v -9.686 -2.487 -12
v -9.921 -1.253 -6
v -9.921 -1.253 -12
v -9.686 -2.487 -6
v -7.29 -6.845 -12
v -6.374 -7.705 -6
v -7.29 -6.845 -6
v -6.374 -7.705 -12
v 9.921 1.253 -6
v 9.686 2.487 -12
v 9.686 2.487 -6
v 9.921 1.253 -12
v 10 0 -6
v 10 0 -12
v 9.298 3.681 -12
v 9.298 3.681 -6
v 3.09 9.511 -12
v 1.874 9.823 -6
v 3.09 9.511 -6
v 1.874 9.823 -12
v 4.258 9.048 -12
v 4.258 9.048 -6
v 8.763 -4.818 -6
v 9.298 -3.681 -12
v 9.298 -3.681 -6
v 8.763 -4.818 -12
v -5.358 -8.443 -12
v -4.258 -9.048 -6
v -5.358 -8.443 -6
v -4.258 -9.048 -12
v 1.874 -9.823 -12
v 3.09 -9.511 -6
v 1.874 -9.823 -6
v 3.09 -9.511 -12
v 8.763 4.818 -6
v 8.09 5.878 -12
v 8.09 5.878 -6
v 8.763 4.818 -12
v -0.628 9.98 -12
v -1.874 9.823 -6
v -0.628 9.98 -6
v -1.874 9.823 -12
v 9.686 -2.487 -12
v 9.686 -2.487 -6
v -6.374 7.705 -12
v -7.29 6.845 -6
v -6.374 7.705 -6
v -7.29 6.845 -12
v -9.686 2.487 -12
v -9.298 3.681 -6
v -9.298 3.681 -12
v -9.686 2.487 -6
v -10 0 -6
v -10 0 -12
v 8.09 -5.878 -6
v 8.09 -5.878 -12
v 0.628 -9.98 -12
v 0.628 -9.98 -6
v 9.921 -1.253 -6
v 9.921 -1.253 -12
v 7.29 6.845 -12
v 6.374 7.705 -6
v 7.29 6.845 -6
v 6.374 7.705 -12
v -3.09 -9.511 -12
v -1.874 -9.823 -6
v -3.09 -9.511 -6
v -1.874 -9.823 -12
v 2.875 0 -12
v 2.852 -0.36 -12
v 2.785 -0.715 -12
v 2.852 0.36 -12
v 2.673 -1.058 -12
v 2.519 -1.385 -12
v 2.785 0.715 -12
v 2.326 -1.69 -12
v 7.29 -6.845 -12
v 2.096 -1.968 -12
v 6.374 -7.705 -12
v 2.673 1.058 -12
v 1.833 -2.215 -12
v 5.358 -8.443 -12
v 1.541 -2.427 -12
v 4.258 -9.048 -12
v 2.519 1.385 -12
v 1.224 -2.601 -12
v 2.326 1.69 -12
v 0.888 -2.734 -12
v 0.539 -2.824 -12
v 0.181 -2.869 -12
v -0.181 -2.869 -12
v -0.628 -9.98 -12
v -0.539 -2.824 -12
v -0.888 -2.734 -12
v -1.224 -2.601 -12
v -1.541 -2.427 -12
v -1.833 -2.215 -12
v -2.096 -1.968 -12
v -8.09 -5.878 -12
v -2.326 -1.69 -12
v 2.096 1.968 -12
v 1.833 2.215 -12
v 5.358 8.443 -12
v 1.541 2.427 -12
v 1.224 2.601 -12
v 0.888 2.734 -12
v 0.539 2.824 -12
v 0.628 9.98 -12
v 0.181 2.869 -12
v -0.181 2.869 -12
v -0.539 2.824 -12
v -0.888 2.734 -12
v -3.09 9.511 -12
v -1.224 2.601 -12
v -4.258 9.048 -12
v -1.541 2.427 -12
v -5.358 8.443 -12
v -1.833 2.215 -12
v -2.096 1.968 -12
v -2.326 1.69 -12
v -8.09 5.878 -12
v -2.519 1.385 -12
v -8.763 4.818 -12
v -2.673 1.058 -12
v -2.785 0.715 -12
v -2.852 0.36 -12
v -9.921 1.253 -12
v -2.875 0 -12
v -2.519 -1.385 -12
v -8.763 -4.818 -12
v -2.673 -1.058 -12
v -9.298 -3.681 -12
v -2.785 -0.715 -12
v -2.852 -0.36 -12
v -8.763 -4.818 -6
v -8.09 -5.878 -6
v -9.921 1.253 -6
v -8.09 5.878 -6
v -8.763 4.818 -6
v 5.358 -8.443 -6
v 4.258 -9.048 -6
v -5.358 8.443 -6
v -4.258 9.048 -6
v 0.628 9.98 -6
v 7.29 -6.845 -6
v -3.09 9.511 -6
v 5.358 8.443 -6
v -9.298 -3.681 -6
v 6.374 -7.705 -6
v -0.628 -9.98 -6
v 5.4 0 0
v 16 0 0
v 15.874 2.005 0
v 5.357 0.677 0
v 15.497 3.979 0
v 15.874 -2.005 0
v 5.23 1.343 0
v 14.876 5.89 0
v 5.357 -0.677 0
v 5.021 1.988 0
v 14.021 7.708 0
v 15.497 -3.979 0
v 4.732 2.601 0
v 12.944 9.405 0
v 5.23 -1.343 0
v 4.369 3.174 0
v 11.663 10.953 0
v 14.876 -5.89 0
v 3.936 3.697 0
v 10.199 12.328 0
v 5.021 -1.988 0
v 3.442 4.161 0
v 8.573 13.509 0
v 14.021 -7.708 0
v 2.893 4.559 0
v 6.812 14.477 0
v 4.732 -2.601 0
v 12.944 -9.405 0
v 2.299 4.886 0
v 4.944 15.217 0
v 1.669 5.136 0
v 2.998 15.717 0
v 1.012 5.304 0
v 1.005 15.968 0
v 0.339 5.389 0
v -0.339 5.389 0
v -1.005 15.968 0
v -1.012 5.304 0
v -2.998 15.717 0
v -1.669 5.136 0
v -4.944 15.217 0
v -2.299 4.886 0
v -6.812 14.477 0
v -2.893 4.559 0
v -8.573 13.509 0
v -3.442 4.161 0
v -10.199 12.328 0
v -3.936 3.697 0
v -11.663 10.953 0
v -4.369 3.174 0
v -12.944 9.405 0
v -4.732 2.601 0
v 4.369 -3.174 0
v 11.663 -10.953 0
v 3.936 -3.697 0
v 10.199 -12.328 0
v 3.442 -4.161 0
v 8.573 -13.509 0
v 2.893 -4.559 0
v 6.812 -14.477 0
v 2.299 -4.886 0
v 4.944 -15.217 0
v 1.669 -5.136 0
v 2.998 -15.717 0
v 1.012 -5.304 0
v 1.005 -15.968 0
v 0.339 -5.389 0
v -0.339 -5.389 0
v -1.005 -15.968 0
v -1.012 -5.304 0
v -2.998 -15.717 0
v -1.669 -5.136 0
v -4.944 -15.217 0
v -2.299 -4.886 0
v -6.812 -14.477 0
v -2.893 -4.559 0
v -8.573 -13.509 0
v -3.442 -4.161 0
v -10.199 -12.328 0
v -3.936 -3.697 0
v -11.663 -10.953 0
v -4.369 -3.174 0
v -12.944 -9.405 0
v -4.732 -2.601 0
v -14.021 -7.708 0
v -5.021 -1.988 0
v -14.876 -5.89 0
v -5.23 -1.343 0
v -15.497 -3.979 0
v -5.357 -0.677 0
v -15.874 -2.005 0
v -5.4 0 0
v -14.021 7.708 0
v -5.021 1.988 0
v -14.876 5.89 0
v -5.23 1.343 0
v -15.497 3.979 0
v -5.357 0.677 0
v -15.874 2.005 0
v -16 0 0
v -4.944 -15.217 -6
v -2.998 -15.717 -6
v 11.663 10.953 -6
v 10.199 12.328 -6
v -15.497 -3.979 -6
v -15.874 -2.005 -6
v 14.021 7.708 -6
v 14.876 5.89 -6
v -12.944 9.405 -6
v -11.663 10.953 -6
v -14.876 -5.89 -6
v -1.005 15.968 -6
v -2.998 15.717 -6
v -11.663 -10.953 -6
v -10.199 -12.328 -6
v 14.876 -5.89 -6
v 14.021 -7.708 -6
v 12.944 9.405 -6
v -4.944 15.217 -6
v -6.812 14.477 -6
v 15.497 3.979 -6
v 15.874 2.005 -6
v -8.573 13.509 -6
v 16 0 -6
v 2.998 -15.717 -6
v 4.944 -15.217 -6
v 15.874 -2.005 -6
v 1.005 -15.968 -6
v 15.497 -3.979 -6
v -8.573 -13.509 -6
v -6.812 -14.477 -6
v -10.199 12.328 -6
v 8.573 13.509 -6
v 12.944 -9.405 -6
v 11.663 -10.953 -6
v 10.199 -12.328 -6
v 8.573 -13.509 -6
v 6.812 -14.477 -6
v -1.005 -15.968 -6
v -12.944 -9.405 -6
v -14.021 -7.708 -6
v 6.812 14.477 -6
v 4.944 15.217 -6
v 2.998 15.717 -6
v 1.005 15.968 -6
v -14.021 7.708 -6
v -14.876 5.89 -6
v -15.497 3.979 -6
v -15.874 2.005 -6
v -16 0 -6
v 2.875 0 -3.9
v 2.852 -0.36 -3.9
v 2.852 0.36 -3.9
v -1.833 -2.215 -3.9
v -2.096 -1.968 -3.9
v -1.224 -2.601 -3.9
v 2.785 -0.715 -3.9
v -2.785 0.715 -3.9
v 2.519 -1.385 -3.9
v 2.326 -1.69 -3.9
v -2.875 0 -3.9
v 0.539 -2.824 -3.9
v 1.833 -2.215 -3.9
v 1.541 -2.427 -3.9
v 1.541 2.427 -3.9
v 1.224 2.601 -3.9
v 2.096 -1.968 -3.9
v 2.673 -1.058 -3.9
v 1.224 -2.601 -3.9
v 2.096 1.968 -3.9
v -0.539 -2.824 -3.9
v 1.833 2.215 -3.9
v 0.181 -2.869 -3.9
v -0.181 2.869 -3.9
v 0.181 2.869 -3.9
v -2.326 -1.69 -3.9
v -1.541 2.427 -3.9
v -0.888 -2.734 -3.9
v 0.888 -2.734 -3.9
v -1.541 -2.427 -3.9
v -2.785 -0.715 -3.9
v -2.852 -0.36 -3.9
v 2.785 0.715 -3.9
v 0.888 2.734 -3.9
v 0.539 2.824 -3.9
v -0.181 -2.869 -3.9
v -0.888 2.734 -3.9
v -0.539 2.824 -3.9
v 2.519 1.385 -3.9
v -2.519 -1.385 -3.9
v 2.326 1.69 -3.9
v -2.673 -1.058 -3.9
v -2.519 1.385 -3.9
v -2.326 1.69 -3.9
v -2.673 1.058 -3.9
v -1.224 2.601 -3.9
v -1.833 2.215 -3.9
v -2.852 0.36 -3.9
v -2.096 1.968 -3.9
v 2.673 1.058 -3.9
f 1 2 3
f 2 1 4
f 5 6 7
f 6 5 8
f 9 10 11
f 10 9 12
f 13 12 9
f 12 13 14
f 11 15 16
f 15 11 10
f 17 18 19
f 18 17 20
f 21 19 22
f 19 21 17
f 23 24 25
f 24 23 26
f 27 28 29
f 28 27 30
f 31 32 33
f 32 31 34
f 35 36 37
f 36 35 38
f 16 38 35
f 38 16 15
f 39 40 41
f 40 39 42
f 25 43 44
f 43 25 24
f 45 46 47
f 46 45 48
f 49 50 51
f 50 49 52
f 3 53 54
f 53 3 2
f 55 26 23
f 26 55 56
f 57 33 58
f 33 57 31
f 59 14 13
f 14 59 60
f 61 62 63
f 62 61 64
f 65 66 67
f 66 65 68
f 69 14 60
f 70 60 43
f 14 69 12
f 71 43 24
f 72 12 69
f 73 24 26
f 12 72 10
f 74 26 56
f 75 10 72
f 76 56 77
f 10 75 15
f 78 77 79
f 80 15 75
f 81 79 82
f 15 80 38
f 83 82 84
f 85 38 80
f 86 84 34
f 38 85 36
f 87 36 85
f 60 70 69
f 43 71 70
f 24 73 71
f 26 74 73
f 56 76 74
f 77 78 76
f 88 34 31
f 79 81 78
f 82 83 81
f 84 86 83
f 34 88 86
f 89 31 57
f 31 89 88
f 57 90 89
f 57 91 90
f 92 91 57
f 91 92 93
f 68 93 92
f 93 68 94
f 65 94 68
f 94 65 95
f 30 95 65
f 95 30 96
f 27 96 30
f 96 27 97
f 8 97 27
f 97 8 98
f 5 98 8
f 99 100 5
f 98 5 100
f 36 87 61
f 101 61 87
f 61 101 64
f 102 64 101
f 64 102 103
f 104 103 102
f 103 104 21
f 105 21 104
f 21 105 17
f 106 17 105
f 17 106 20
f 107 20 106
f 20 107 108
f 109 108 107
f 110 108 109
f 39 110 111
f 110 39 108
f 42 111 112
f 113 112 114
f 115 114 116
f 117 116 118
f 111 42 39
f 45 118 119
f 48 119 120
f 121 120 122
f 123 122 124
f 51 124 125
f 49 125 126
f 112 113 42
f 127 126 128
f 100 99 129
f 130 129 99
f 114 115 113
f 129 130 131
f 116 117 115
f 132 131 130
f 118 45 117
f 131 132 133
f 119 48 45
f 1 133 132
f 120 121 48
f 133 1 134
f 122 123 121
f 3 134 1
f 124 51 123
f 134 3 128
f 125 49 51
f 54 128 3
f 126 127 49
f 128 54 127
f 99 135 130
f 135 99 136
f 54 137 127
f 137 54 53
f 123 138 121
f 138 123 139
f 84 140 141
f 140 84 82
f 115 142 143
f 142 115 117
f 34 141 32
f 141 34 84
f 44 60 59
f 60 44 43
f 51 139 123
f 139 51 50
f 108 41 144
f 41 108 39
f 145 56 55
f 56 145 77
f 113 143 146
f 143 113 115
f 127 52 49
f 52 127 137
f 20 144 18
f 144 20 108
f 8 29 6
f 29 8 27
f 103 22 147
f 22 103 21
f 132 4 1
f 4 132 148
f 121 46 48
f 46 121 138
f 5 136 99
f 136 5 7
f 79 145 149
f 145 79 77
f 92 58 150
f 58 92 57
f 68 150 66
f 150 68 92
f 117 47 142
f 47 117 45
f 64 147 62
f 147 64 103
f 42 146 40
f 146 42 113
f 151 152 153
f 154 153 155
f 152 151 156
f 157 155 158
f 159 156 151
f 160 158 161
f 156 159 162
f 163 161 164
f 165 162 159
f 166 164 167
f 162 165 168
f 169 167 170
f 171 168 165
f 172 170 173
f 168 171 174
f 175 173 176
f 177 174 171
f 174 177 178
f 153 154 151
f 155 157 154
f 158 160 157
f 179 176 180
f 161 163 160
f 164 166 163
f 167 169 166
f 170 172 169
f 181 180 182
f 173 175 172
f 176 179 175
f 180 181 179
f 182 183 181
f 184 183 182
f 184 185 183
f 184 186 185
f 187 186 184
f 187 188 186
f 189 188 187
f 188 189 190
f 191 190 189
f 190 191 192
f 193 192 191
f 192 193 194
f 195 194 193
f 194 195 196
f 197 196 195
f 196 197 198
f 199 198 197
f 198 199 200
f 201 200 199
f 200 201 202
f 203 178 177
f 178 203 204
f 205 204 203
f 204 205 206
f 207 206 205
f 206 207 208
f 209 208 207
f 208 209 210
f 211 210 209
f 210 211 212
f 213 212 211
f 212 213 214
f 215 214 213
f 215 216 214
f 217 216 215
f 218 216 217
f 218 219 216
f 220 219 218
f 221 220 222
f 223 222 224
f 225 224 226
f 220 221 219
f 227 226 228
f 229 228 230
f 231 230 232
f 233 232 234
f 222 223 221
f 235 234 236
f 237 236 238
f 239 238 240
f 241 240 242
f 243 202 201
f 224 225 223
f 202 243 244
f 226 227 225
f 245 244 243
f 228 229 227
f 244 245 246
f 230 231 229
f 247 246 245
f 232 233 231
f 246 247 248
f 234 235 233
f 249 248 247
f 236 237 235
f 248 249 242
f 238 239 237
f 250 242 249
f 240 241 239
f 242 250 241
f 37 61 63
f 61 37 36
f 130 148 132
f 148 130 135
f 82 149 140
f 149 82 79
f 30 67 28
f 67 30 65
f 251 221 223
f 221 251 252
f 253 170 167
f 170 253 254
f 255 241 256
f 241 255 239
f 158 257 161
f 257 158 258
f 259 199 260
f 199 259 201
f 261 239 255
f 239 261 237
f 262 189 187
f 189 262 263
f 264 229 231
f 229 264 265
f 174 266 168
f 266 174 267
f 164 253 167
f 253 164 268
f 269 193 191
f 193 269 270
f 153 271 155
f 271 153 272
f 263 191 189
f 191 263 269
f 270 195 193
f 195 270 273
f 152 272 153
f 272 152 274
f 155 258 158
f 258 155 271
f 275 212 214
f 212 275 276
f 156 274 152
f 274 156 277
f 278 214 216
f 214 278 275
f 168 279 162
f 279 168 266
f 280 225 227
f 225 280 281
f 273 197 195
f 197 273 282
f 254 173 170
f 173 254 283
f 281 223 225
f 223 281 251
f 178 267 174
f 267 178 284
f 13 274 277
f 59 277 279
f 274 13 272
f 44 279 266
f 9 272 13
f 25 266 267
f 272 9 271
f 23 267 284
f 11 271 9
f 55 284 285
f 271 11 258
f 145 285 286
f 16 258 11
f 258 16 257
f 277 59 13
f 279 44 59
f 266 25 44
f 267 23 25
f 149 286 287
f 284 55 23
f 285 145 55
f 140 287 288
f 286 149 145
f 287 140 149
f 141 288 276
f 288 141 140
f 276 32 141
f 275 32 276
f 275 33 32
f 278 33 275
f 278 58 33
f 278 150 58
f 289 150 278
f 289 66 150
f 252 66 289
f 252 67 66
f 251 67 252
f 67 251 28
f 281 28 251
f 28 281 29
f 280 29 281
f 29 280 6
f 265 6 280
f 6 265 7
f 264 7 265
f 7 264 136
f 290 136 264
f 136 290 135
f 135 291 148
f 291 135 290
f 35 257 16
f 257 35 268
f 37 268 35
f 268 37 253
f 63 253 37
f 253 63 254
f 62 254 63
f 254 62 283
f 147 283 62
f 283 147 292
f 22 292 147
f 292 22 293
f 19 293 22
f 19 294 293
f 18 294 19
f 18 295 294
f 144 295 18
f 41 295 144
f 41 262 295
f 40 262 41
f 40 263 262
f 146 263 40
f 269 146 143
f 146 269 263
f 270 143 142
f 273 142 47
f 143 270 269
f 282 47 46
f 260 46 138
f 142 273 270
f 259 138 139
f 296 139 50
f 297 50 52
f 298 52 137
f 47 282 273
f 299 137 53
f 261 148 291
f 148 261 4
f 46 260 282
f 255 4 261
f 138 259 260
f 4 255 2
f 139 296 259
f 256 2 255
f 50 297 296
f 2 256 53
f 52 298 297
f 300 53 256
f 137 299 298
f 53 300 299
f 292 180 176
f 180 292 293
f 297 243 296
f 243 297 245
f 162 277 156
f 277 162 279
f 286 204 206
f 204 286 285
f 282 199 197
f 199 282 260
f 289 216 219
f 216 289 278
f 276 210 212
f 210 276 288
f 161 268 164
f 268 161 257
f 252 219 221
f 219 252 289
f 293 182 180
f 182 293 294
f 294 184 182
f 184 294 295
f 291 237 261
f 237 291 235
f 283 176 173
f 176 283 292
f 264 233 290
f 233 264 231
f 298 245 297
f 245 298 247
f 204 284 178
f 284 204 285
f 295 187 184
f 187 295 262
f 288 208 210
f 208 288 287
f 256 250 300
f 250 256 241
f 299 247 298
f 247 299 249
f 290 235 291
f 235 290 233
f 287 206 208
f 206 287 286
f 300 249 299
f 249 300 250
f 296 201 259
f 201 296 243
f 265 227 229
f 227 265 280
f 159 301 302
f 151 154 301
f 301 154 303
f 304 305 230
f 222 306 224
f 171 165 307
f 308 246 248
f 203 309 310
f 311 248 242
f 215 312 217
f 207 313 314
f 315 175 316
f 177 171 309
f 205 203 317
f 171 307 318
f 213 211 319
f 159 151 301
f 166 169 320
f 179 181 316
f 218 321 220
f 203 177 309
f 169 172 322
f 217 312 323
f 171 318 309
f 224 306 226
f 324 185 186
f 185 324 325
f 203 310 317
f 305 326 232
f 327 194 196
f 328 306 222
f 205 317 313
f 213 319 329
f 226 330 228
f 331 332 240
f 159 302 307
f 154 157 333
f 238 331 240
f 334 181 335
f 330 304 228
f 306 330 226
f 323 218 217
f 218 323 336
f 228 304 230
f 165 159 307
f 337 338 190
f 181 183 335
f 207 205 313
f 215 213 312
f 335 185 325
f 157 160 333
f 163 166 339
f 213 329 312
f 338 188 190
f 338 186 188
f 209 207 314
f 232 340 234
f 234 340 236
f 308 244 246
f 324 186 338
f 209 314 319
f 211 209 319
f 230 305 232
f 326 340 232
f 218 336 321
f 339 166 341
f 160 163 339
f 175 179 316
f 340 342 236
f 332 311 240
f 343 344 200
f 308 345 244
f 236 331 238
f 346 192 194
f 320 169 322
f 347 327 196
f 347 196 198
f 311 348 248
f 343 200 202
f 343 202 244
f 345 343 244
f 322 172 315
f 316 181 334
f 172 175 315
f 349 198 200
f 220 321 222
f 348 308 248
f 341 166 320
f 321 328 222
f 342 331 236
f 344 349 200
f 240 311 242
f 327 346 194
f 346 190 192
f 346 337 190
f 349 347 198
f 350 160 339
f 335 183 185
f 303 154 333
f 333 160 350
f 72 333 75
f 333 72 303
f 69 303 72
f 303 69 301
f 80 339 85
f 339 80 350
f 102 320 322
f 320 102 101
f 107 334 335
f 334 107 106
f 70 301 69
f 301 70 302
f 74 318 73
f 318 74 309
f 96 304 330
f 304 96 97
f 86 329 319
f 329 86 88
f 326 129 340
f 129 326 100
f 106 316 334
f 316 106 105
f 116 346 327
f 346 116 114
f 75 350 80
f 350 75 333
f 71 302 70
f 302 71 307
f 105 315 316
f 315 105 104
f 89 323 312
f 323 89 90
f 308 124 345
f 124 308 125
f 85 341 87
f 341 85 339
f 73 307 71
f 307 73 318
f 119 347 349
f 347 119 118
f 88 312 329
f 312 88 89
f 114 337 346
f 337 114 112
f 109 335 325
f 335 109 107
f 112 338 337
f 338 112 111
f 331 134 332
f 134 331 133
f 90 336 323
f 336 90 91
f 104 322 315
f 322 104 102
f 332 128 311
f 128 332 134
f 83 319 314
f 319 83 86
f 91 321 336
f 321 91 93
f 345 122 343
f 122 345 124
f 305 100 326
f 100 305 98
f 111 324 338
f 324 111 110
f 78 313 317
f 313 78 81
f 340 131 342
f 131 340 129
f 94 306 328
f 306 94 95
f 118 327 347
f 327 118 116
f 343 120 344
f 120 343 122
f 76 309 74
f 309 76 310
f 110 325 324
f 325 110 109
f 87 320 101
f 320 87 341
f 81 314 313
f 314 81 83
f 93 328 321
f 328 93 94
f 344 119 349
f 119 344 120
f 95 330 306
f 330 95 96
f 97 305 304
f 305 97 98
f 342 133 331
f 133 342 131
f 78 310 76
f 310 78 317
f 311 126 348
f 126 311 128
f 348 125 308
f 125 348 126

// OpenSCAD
$fn = 50;


difference() {
	union() {
		translate(v = [0, 0, -12.0000000000]) {
			cylinder(h = 12, r = 10.0000000000);
		}
		translate(v = [0, 0, -6.0000000000]) {
			cylinder(h = 6, r = 16.0000000000);
		}
	}
	union() {
		translate(v = [0, 0, 0]) {
			rotate(a = [0, 0, 0]) {
				difference() {
					union() {
						#translate(v = [0, 0, -12.0000000000]) {
							cylinder(h = 12, r = 2.6000000000);
						}
						#translate(v = [0, 0, -3.9000000000]) {
							cylinder(h = 3.9000000000, r = 10.0000000000, r1 = 2.8750000000, r2 = 5.4000000000);
						}
						#translate(v = [0, 0, -12.0000000000]) {
							cylinder(h = 12, r = 2.8750000000);
						}
						#translate(v = [0, 0, -12.0000000000]) {
							cylinder(h = 12, r = 2.6000000000);
						}
					}
					union();
				}
			}
		}
	}
}
